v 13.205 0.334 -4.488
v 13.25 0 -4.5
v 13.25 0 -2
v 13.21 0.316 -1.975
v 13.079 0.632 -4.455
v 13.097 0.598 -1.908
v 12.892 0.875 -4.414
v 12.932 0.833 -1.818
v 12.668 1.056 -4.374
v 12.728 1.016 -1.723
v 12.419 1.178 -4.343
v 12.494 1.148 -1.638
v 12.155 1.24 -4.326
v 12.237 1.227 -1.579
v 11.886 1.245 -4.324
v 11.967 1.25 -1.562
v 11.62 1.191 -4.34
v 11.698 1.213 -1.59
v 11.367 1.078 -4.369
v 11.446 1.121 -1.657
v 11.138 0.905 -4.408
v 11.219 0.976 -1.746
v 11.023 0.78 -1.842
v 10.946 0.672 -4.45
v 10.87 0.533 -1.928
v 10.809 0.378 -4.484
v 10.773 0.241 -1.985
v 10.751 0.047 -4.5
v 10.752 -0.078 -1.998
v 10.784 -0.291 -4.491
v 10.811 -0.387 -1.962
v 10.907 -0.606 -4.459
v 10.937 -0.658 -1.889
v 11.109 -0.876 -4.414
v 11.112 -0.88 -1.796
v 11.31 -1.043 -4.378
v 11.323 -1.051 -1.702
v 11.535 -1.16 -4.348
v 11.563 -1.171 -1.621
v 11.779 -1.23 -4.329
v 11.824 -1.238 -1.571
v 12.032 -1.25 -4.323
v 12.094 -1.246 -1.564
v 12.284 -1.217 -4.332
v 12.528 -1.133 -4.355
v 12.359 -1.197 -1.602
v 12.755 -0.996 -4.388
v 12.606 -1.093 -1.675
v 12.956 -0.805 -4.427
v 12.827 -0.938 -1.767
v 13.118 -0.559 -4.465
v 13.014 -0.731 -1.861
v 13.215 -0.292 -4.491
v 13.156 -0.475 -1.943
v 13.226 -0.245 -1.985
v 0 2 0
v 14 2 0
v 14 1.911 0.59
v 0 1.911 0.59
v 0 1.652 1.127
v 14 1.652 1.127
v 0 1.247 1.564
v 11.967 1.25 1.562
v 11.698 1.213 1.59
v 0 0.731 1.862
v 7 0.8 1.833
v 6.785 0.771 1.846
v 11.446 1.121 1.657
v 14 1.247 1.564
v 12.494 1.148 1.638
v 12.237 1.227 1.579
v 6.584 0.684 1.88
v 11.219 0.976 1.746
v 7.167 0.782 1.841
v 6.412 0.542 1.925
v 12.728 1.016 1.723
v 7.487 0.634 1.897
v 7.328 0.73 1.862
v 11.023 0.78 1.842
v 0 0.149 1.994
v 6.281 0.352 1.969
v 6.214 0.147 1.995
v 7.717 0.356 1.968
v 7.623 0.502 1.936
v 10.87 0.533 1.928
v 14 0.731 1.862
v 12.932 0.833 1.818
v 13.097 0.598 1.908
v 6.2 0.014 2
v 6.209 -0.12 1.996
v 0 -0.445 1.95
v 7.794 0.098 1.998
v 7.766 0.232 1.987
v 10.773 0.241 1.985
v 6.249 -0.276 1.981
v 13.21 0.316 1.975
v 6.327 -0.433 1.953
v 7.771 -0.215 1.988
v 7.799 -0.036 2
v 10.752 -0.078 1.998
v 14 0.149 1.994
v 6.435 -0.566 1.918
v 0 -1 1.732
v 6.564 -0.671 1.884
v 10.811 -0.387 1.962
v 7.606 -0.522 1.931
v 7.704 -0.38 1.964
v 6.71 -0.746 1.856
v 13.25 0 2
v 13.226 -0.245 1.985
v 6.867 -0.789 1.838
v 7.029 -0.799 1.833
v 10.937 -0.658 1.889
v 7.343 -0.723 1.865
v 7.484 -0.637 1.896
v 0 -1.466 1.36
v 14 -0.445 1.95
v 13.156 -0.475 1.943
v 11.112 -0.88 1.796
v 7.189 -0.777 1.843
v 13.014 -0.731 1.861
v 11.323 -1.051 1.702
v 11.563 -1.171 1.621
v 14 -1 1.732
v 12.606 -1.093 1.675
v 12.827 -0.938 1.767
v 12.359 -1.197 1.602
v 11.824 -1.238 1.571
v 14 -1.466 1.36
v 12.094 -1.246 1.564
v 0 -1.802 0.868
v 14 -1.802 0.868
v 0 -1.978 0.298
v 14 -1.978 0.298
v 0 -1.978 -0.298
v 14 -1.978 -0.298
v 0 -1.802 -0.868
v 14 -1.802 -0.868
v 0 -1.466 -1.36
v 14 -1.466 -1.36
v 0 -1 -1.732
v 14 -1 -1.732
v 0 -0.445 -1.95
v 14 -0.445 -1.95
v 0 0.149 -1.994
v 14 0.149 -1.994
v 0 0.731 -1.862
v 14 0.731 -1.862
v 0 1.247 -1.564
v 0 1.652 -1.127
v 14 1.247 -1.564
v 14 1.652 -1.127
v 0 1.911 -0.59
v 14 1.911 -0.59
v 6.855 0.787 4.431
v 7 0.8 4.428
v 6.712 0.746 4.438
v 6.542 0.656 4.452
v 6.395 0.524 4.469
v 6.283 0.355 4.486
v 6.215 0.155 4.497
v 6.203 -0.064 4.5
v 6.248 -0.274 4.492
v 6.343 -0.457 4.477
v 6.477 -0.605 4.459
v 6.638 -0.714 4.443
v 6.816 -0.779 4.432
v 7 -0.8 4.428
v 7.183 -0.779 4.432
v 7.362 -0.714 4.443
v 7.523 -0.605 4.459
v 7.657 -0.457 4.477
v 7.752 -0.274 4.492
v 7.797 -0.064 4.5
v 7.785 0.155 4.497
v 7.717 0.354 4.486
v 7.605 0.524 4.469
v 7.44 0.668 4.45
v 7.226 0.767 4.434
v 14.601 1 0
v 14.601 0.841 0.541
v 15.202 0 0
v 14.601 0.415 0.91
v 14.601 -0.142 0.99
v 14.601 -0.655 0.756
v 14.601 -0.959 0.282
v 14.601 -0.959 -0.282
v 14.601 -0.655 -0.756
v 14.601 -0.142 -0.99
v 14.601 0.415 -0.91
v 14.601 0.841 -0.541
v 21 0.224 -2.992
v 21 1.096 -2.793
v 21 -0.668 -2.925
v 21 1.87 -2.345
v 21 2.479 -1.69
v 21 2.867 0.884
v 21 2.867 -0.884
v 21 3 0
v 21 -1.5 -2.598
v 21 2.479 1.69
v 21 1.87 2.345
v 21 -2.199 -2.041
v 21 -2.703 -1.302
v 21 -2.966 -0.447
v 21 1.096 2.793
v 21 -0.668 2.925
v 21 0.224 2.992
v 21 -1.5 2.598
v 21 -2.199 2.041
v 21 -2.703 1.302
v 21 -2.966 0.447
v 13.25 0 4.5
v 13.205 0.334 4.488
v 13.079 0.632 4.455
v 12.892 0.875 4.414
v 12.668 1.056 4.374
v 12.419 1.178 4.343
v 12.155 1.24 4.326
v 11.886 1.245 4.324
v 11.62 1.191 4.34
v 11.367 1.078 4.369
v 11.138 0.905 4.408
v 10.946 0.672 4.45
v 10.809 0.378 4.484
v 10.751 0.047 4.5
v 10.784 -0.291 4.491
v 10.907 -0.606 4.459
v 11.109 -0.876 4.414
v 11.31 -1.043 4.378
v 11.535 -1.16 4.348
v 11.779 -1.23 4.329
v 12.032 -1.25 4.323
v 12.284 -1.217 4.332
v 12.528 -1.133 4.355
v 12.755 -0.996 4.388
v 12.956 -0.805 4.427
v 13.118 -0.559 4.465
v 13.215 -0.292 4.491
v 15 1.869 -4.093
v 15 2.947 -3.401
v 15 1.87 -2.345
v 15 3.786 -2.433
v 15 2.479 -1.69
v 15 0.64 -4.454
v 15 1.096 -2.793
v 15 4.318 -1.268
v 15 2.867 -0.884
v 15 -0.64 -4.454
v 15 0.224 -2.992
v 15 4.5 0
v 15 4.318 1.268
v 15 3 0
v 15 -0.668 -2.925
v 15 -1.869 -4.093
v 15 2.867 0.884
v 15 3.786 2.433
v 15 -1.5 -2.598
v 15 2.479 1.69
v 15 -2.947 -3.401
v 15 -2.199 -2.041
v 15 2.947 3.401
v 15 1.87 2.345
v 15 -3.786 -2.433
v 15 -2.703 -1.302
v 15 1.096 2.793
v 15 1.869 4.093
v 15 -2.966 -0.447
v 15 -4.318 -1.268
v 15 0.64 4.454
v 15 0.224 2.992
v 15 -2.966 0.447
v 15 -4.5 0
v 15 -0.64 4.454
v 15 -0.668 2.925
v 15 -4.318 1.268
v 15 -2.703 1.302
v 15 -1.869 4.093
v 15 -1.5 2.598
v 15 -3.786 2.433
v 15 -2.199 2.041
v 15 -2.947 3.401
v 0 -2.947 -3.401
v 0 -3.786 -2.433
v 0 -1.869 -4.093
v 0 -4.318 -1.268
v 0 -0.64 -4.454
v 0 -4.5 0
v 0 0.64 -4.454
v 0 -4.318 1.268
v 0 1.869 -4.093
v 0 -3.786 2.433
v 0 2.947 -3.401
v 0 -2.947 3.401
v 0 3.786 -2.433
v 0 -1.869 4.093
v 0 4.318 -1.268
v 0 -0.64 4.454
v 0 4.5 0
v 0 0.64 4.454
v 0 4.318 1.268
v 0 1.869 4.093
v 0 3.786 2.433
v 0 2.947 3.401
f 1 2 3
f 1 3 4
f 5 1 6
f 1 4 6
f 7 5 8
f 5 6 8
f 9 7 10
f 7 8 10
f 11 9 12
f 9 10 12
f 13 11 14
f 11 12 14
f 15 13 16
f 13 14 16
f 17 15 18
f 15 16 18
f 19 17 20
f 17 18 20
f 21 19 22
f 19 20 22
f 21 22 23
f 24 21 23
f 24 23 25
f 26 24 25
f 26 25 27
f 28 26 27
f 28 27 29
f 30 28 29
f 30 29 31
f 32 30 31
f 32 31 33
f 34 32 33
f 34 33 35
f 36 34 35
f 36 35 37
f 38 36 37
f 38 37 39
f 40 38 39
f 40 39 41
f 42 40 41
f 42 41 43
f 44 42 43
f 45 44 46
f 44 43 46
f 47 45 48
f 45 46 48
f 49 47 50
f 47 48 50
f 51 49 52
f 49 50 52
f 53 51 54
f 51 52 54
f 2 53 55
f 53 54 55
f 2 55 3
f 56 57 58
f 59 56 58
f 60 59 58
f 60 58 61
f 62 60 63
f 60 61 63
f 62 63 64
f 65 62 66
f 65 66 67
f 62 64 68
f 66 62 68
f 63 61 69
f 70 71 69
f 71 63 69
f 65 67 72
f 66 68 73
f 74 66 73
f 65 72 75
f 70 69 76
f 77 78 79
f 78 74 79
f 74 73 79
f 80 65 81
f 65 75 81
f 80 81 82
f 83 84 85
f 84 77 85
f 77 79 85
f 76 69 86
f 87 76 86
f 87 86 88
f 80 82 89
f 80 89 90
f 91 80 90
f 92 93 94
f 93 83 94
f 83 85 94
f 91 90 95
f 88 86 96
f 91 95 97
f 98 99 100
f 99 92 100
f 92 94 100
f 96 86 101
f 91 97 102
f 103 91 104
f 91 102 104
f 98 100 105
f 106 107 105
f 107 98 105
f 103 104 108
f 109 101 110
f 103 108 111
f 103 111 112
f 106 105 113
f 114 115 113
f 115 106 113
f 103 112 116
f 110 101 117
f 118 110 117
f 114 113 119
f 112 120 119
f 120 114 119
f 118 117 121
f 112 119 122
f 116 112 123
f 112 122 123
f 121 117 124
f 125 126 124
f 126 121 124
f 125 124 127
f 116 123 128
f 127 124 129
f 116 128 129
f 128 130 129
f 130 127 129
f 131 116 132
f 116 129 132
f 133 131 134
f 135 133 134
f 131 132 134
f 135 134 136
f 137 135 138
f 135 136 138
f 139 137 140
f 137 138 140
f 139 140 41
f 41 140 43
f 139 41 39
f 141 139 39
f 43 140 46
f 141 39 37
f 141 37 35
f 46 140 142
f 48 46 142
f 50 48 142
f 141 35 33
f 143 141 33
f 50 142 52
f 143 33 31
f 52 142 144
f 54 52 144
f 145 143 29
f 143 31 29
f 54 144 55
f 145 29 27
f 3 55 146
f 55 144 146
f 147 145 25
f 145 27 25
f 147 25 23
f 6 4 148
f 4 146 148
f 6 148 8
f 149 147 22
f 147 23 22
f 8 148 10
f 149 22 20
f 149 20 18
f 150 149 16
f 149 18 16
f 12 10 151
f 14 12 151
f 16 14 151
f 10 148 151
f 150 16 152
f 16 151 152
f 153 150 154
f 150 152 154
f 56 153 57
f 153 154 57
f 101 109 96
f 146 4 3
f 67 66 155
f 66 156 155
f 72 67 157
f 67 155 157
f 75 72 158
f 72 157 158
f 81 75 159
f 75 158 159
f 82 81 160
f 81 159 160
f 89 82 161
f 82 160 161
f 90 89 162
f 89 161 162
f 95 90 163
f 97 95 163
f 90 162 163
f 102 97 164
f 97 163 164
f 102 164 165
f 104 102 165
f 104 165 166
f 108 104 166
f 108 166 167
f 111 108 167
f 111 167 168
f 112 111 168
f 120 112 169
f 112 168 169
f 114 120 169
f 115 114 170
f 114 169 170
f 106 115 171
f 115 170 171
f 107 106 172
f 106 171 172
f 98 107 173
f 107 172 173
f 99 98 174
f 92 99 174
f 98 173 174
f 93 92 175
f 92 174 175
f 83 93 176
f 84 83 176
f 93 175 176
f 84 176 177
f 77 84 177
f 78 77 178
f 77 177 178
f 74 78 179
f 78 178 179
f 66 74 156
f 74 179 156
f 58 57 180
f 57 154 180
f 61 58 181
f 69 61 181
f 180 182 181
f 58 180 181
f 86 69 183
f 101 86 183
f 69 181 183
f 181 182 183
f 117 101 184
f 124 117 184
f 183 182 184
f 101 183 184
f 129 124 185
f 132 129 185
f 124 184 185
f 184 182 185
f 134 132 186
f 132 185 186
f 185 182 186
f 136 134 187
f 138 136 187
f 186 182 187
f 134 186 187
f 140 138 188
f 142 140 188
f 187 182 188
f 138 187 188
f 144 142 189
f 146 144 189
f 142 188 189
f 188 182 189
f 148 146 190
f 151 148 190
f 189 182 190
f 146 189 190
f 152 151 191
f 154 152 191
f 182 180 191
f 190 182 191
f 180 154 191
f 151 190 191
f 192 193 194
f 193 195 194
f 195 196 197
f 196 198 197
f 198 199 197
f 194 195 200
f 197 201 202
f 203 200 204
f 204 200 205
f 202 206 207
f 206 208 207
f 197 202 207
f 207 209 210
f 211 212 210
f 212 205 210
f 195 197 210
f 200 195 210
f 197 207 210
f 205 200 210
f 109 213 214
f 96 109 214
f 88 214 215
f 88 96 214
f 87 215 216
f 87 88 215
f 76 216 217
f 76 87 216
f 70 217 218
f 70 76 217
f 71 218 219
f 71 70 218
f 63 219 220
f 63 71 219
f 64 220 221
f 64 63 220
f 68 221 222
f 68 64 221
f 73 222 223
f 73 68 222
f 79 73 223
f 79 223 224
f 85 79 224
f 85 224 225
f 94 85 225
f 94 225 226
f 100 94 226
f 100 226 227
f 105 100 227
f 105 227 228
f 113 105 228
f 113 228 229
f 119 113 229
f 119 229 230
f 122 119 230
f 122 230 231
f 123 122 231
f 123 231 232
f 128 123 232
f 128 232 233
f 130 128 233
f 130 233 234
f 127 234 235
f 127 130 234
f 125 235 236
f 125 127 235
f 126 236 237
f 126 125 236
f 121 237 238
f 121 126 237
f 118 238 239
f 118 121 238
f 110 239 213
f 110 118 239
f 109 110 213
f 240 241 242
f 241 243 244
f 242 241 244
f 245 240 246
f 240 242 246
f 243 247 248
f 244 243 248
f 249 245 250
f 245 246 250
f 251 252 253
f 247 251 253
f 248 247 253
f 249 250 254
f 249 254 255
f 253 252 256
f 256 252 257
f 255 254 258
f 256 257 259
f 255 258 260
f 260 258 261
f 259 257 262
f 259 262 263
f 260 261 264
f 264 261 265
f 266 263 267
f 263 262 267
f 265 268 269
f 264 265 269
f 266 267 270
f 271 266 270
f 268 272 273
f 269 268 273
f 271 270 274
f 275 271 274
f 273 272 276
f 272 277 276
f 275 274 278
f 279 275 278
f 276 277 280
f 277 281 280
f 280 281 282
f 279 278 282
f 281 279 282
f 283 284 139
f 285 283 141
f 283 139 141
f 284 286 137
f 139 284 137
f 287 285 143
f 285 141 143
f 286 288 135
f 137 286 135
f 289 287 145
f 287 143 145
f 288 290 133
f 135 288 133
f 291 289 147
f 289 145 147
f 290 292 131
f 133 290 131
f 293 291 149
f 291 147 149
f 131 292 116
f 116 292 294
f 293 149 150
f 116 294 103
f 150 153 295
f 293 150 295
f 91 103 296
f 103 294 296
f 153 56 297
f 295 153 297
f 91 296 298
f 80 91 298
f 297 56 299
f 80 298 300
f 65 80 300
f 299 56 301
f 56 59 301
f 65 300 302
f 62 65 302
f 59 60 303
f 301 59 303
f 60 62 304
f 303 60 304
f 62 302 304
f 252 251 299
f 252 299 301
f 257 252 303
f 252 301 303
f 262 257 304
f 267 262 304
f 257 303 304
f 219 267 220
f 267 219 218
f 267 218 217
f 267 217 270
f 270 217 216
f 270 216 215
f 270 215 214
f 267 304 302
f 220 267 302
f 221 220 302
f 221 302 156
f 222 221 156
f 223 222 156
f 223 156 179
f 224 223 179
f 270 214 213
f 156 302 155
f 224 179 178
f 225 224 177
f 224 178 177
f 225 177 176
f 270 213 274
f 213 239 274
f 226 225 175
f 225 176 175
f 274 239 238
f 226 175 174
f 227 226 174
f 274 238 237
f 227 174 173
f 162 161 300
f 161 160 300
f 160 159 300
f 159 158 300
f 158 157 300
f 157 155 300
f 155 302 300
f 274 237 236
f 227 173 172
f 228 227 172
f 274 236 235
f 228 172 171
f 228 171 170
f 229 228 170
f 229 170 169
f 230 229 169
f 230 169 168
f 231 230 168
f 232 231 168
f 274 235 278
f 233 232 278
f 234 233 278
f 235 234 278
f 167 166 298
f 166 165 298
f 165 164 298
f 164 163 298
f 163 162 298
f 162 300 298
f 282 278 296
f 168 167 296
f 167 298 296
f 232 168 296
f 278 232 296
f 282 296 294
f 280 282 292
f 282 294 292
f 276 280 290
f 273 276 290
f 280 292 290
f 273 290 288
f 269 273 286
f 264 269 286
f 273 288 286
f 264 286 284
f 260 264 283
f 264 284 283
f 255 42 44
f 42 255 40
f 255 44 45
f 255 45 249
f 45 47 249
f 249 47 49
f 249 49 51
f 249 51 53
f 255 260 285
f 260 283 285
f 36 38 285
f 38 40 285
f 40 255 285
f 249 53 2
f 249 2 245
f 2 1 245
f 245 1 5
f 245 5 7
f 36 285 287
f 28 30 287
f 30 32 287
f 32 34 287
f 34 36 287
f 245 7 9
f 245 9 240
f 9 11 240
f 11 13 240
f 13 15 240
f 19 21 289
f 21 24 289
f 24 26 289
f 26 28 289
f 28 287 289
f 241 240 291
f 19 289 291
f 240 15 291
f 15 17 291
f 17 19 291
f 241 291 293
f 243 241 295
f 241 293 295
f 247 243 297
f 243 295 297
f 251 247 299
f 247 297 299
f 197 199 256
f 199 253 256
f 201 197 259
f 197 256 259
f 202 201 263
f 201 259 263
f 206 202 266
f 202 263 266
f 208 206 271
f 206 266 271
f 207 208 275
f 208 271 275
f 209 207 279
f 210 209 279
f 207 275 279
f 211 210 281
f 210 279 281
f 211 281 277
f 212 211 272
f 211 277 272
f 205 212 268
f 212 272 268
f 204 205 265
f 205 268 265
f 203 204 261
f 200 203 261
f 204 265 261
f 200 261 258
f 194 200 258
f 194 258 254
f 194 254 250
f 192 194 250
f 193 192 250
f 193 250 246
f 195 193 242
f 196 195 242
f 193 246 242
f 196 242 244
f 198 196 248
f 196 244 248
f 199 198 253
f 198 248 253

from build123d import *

# Parameters (mm, degrees)
SKIZZE5_W                            = 0.8
SKIZZE5_H                            = 4.5
SKIZZE7_R                            = 1.25
SCHNITT_LINEAR_AUSTRAGEN2_DEPTH      = 5.50000011
SCHNITT_LINEAR_AUSTRAGEN2_DEPTH_BACK = 5.5000001


with BuildPart() as part:
    # Skizze1 → Rotation1 (revolve)
    with BuildSketch(Plane.XY):
        Polygon((0, 4.5), (0, 2), (14, 2), (15.201721238, 0), (21, 0), (21, 3), (15, 3), (15, 4.5), align=None)
    revolve(axis=Axis((0, 0, 0), (1, 0, 0)))

    # Skizze5 → M2 Gewindebohrung1 (revolve, cut)
    with BuildSketch(Plane.YZ.offset(7)):
        with Locations((0.4, 2.25)):
            Rectangle(SKIZZE5_W, SKIZZE5_H)
    revolve(axis=Axis((7, 0, -6.35), (0, 0, 1)), mode=Mode.SUBTRACT)

    # Skizze7 → Schnitt-Linear austragen2 (cut, two sides)
    with BuildSketch(Plane.XY) as schnitt_linear_austragen2_sk:
        with Locations((12, 0)):
            Circle(SKIZZE7_R)
    extrude(amount=SCHNITT_LINEAR_AUSTRAGEN2_DEPTH, mode=Mode.SUBTRACT)
    extrude(schnitt_linear_austragen2_sk.sketch, amount=-SCHNITT_LINEAR_AUSTRAGEN2_DEPTH_BACK, mode=Mode.SUBTRACT)


solid = part.part
